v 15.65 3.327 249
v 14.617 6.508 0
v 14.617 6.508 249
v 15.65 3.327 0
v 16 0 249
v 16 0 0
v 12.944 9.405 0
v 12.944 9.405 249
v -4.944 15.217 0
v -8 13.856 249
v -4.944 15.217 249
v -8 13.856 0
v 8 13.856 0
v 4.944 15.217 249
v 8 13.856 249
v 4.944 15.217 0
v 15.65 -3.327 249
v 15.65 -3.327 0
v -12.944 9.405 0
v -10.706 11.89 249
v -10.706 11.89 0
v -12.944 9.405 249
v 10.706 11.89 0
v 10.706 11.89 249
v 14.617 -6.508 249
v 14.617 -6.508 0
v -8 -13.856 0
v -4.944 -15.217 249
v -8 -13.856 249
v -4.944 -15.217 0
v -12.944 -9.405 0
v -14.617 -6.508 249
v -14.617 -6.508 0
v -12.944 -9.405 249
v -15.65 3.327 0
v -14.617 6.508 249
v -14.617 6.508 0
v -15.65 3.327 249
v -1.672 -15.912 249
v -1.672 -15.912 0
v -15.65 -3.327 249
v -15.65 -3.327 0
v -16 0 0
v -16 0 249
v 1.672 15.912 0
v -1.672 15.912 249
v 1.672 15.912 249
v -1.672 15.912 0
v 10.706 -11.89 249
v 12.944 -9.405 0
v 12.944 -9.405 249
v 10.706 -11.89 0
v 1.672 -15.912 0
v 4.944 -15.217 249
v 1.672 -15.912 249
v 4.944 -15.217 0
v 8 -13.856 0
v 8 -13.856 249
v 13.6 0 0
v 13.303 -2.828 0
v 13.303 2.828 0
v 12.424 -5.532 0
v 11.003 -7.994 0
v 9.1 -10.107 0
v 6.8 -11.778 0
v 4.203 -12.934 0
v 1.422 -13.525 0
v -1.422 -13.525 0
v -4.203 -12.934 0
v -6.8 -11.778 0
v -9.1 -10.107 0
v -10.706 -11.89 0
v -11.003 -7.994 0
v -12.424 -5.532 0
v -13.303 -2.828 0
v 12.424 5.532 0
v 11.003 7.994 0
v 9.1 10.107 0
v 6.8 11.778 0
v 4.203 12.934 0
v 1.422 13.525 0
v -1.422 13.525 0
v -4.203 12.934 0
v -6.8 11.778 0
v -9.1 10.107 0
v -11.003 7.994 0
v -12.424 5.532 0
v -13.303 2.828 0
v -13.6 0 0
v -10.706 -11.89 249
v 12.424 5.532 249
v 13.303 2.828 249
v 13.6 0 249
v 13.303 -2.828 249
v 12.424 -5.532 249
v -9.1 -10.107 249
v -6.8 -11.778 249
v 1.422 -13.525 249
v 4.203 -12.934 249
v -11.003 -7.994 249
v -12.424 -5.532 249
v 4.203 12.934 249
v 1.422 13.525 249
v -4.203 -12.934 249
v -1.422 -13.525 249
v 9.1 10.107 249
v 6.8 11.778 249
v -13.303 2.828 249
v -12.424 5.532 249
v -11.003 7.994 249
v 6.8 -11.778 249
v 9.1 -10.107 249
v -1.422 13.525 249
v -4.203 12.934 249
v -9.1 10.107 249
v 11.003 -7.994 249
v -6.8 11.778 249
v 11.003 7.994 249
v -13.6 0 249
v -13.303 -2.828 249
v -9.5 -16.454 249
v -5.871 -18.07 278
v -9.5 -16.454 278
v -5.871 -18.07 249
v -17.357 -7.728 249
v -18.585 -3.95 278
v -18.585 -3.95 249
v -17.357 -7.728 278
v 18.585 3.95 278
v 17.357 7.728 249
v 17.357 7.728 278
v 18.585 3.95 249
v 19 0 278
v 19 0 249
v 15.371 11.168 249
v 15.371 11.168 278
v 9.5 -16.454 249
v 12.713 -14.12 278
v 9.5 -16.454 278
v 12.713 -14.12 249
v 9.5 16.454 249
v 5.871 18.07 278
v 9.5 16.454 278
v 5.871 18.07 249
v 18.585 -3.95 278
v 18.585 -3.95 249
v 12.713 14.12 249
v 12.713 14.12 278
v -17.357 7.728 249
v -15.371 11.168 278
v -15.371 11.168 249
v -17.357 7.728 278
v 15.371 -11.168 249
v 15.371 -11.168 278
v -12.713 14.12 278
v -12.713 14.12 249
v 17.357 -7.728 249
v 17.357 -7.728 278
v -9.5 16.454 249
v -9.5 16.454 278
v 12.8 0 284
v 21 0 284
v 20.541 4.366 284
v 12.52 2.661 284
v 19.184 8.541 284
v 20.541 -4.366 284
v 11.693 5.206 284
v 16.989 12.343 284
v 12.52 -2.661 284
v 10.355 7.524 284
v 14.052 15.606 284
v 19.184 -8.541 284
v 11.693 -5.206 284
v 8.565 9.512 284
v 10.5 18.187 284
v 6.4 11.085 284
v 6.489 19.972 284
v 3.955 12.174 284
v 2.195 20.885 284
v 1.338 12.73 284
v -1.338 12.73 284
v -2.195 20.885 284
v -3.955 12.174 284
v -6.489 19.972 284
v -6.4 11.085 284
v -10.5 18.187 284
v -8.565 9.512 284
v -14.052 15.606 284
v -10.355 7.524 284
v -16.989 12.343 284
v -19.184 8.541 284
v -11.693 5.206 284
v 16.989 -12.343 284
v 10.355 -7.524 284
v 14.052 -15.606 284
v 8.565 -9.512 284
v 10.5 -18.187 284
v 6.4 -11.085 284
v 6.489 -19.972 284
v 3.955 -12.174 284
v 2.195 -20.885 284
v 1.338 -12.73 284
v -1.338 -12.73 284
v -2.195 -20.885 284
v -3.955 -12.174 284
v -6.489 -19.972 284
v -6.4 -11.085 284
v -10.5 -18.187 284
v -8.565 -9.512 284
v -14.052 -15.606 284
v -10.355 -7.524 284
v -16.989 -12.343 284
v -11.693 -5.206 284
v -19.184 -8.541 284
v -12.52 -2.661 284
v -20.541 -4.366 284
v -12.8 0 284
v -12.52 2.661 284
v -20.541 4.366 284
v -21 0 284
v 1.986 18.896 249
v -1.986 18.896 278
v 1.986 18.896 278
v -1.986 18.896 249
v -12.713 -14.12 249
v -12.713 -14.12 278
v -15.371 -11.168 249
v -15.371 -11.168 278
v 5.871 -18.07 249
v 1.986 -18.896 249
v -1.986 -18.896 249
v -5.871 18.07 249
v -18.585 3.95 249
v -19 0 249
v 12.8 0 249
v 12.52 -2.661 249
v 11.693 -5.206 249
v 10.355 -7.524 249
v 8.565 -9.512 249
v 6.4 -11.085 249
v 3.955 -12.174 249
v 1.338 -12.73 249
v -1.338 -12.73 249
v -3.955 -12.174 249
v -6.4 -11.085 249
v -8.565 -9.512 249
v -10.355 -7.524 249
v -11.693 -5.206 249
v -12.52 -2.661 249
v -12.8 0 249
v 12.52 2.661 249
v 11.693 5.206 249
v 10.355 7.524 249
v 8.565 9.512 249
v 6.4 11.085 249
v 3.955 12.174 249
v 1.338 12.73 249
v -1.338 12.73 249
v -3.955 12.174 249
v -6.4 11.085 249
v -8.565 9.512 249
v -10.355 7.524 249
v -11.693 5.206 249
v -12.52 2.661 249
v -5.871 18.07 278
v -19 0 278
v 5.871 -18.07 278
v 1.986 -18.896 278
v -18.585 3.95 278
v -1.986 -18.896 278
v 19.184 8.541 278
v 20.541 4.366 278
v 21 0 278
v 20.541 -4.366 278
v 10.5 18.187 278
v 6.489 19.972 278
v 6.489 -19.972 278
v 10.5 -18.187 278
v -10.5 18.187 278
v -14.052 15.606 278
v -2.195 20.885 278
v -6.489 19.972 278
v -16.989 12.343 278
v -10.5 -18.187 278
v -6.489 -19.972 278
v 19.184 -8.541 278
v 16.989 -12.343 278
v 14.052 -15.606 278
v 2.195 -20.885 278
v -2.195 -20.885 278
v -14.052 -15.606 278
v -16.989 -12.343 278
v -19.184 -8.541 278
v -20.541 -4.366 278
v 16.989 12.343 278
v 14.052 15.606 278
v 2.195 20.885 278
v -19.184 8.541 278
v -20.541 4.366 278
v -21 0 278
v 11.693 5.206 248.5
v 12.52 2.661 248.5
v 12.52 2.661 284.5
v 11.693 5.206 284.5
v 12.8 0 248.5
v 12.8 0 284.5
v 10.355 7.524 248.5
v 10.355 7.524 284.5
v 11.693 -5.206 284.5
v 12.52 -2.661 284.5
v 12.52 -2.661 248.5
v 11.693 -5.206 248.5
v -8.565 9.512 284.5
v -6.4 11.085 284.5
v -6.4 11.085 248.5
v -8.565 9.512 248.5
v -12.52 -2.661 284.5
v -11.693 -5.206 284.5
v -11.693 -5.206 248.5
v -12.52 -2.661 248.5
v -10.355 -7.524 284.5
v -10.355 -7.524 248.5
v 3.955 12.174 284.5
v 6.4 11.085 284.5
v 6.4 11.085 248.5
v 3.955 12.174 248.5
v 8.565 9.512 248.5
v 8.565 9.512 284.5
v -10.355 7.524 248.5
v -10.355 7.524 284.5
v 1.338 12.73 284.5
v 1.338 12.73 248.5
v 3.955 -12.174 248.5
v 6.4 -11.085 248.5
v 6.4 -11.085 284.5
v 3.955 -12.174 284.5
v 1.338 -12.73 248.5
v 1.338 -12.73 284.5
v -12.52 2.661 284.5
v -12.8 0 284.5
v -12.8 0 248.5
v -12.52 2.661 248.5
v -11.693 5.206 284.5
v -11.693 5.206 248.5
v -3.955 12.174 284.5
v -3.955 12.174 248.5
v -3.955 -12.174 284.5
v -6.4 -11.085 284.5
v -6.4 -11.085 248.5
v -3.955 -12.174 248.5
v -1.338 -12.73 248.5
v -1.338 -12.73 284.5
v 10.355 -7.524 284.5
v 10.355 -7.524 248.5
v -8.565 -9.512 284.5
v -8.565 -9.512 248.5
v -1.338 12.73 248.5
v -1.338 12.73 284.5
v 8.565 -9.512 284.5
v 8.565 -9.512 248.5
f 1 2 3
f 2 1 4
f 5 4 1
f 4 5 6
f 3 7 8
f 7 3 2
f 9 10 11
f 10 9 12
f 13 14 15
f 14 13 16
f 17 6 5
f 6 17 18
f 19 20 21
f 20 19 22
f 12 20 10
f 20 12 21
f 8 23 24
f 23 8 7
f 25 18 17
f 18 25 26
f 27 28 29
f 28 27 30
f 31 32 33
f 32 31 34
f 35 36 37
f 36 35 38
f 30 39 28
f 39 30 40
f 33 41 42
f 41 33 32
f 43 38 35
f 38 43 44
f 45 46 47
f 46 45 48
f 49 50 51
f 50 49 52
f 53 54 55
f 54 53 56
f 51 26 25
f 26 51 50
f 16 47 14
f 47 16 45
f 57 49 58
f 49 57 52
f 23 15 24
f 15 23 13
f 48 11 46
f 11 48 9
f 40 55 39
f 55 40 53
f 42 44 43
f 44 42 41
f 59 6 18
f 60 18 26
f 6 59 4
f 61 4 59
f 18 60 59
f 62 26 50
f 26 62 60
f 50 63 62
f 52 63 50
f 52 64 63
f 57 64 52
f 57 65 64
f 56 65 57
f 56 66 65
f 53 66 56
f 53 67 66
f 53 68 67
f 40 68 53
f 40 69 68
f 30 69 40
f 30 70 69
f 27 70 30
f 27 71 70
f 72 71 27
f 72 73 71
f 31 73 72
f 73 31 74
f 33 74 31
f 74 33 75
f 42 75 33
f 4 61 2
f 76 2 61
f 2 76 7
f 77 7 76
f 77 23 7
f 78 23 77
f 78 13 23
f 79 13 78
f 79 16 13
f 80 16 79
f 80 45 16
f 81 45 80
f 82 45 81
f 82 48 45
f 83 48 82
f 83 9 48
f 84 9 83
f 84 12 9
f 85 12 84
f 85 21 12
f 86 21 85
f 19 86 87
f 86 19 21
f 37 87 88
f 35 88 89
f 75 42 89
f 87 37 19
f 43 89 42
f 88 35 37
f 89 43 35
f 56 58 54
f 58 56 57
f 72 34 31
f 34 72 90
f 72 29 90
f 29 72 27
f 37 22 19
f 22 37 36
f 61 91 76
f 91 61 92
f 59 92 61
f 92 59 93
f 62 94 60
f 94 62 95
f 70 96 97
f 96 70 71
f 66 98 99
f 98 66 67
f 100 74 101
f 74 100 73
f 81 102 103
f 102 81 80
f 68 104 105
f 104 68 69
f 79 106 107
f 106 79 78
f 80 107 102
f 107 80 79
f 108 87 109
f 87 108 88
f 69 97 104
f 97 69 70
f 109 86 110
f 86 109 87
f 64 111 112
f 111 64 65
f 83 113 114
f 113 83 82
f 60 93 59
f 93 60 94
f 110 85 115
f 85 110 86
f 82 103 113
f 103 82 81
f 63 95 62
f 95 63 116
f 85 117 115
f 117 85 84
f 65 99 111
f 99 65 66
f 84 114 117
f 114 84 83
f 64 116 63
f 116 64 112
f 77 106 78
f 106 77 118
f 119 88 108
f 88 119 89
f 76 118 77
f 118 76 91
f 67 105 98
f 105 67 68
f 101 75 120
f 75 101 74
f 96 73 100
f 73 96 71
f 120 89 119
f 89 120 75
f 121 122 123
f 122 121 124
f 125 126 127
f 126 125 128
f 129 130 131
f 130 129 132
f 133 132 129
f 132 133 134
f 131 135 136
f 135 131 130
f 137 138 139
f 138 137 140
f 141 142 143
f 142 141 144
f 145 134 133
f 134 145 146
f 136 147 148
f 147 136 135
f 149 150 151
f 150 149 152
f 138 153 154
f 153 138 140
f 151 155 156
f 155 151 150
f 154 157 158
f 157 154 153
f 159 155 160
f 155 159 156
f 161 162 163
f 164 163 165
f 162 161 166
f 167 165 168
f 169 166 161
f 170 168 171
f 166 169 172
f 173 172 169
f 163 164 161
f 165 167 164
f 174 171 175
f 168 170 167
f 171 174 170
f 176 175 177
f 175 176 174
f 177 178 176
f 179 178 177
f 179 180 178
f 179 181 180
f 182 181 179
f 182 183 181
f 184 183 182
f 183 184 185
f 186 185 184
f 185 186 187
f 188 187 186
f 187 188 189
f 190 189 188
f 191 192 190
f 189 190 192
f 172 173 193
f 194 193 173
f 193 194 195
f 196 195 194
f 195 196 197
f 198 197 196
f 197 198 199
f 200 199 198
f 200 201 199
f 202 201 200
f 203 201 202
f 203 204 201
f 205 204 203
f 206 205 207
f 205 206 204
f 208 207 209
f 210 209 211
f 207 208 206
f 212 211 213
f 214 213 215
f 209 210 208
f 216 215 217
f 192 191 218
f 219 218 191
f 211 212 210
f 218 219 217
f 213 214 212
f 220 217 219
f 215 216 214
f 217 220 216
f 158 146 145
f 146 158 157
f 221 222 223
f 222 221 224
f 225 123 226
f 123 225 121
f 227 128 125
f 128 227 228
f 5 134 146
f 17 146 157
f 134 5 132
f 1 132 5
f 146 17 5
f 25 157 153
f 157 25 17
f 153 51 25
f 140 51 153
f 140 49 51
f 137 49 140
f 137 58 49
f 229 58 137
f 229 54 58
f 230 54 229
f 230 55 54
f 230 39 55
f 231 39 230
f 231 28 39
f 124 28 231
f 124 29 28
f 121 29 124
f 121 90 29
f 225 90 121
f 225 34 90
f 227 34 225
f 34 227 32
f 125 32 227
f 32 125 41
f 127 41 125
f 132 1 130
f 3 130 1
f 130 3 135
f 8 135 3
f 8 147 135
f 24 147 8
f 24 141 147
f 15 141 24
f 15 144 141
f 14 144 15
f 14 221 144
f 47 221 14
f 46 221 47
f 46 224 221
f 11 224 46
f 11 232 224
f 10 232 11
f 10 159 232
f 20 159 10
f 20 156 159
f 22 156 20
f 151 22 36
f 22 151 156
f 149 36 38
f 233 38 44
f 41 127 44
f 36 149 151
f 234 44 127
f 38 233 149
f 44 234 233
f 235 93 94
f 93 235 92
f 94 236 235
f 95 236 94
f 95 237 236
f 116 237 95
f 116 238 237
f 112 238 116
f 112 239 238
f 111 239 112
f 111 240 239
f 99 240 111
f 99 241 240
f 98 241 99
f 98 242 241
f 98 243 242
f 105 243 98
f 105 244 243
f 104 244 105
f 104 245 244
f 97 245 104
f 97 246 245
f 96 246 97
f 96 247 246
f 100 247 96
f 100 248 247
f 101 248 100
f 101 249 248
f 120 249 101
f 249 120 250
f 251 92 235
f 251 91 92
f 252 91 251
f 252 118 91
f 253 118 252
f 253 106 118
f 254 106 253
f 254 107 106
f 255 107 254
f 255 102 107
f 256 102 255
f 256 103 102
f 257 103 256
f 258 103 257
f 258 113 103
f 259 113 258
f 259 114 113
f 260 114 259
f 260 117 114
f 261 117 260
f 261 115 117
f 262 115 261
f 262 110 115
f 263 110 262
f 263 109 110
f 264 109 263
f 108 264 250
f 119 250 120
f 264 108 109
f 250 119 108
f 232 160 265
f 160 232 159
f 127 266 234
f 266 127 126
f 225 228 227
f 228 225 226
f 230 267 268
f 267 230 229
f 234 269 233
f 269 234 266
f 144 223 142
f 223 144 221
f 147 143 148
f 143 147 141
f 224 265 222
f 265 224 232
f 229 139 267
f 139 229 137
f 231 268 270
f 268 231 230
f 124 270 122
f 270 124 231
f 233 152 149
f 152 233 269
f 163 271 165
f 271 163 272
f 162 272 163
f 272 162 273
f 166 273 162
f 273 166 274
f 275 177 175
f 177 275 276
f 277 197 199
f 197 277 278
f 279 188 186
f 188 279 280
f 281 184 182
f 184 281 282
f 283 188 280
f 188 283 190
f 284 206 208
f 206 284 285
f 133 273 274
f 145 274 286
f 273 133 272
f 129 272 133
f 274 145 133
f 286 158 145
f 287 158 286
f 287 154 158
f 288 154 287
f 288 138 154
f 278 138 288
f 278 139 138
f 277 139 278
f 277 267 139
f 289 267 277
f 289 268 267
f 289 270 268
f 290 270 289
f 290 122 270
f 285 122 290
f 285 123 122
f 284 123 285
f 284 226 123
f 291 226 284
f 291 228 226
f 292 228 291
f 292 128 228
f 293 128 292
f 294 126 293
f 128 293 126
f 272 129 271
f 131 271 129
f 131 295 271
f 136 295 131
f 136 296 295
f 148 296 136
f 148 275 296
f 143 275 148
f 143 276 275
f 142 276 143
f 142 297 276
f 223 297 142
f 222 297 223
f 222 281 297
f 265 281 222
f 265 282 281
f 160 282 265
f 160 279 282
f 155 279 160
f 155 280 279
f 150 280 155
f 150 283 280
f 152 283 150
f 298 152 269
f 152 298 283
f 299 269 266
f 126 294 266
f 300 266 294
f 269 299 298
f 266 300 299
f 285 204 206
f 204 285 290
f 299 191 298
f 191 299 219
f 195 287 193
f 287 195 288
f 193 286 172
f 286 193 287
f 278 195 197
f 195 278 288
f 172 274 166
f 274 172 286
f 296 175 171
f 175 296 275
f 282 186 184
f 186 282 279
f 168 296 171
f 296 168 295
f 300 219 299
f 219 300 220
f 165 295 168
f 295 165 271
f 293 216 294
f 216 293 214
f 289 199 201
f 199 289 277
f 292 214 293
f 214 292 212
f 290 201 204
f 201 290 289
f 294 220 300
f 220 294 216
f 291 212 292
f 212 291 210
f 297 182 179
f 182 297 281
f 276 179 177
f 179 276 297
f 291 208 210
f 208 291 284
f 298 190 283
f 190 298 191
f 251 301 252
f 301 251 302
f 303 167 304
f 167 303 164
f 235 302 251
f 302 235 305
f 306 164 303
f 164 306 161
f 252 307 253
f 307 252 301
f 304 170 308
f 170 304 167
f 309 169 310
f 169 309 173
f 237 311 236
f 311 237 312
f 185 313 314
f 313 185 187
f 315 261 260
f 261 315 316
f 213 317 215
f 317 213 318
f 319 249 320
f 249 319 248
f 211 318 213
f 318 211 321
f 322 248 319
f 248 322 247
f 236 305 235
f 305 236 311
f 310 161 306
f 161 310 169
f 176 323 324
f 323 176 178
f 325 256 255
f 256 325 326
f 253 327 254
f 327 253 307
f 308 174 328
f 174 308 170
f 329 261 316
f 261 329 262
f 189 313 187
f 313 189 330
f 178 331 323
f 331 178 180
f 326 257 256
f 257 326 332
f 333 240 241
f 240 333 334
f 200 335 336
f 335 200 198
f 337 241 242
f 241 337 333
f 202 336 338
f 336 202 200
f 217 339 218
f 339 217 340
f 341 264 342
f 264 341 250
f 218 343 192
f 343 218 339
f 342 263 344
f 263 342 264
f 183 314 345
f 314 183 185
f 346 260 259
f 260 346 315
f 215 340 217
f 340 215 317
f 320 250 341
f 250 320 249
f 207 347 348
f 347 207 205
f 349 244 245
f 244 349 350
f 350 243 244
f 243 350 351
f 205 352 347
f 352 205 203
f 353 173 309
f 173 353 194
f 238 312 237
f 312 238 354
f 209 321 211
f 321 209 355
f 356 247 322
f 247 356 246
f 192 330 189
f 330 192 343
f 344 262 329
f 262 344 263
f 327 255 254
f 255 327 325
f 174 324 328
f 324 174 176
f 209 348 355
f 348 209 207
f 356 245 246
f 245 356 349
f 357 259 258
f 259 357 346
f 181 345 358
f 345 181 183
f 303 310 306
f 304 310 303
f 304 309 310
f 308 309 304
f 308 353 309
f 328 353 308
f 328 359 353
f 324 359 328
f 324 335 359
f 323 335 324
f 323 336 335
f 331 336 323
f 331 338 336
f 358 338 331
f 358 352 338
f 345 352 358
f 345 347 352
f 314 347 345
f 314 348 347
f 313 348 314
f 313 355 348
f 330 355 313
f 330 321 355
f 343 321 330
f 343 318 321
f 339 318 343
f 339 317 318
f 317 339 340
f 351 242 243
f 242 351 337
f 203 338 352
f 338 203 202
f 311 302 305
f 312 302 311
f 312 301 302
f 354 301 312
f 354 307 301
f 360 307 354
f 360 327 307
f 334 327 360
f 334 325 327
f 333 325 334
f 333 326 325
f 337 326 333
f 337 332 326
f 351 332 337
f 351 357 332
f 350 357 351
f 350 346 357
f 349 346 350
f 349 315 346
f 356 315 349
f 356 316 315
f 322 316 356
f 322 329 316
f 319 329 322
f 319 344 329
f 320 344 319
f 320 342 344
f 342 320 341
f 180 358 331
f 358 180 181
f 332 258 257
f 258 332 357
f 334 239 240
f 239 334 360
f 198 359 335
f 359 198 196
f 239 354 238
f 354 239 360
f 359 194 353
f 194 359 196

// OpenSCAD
// Parameters
pipe_standard = 1; //[1:1:1]
nominal_diameter = 32; //[16:64:1]
length_mm = 250; //[125:500:1]
pipe_od = 32; //[16:64:0.5]
wall_thickness = 2.4; //[1.2:4.8:0.1]
fit_socket_od_extra = 6; //[3:12:0.5]
fit_socket_length = 35; //[18:70:1]
fit_stop_ring_length = 6; //[3:12:0.5]
fit_stop_ring_od_extra = 10; //[5:20:0.5]
fit_socket_wall_extra = 0.8; //[0.2:2:0.1]
overlap = 1; //[0.5:2:0.1]

// HT Pipe - complete geometry
module ht_pipe() {
  color([0.85, 0.85, 0.8]) {
    // Pipe body
    difference() {
      cylinder(r=pipe_od/2, h=length_mm, center=false);
      translate([0, 0, -overlap/2])
        cylinder(r=pipe_od/2 - wall_thickness, h=length_mm + overlap, center=false);
    }
    
    // End fitting geometry
    union() {
      // Socket outer
      translate([0, 0, length_mm - overlap])
        cylinder(r=pipe_od/2 + fit_socket_od_extra/2, h=fit_socket_length, center=false);
      
      // Stop ring outer
      translate([0, 0, length_mm + fit_socket_length - fit_stop_ring_length - overlap])
        cylinder(r=pipe_od/2 + fit_stop_ring_od_extra/2, h=fit_stop_ring_length, center=false);
    }
    
    // End fitting inner void
    difference() {
      union() {
        // Socket inner void
        translate([0, 0, length_mm - overlap - overlap/2])
          cylinder(r=pipe_od/2 - wall_thickness - fit_socket_wall_extra, h=fit_socket_length + overlap, center=false);
        
        // Stop ring inner void
        translate([0, 0, length_mm + fit_socket_length - fit_stop_ring_length - overlap - overlap/2])
          cylinder(r=pipe_od/2 - wall_thickness - fit_socket_wall_extra, h=fit_stop_ring_length + overlap, center=false);
      }
    }
  }
}

// Assembly
module assembly() {
  ht_pipe();
}

assembly();
